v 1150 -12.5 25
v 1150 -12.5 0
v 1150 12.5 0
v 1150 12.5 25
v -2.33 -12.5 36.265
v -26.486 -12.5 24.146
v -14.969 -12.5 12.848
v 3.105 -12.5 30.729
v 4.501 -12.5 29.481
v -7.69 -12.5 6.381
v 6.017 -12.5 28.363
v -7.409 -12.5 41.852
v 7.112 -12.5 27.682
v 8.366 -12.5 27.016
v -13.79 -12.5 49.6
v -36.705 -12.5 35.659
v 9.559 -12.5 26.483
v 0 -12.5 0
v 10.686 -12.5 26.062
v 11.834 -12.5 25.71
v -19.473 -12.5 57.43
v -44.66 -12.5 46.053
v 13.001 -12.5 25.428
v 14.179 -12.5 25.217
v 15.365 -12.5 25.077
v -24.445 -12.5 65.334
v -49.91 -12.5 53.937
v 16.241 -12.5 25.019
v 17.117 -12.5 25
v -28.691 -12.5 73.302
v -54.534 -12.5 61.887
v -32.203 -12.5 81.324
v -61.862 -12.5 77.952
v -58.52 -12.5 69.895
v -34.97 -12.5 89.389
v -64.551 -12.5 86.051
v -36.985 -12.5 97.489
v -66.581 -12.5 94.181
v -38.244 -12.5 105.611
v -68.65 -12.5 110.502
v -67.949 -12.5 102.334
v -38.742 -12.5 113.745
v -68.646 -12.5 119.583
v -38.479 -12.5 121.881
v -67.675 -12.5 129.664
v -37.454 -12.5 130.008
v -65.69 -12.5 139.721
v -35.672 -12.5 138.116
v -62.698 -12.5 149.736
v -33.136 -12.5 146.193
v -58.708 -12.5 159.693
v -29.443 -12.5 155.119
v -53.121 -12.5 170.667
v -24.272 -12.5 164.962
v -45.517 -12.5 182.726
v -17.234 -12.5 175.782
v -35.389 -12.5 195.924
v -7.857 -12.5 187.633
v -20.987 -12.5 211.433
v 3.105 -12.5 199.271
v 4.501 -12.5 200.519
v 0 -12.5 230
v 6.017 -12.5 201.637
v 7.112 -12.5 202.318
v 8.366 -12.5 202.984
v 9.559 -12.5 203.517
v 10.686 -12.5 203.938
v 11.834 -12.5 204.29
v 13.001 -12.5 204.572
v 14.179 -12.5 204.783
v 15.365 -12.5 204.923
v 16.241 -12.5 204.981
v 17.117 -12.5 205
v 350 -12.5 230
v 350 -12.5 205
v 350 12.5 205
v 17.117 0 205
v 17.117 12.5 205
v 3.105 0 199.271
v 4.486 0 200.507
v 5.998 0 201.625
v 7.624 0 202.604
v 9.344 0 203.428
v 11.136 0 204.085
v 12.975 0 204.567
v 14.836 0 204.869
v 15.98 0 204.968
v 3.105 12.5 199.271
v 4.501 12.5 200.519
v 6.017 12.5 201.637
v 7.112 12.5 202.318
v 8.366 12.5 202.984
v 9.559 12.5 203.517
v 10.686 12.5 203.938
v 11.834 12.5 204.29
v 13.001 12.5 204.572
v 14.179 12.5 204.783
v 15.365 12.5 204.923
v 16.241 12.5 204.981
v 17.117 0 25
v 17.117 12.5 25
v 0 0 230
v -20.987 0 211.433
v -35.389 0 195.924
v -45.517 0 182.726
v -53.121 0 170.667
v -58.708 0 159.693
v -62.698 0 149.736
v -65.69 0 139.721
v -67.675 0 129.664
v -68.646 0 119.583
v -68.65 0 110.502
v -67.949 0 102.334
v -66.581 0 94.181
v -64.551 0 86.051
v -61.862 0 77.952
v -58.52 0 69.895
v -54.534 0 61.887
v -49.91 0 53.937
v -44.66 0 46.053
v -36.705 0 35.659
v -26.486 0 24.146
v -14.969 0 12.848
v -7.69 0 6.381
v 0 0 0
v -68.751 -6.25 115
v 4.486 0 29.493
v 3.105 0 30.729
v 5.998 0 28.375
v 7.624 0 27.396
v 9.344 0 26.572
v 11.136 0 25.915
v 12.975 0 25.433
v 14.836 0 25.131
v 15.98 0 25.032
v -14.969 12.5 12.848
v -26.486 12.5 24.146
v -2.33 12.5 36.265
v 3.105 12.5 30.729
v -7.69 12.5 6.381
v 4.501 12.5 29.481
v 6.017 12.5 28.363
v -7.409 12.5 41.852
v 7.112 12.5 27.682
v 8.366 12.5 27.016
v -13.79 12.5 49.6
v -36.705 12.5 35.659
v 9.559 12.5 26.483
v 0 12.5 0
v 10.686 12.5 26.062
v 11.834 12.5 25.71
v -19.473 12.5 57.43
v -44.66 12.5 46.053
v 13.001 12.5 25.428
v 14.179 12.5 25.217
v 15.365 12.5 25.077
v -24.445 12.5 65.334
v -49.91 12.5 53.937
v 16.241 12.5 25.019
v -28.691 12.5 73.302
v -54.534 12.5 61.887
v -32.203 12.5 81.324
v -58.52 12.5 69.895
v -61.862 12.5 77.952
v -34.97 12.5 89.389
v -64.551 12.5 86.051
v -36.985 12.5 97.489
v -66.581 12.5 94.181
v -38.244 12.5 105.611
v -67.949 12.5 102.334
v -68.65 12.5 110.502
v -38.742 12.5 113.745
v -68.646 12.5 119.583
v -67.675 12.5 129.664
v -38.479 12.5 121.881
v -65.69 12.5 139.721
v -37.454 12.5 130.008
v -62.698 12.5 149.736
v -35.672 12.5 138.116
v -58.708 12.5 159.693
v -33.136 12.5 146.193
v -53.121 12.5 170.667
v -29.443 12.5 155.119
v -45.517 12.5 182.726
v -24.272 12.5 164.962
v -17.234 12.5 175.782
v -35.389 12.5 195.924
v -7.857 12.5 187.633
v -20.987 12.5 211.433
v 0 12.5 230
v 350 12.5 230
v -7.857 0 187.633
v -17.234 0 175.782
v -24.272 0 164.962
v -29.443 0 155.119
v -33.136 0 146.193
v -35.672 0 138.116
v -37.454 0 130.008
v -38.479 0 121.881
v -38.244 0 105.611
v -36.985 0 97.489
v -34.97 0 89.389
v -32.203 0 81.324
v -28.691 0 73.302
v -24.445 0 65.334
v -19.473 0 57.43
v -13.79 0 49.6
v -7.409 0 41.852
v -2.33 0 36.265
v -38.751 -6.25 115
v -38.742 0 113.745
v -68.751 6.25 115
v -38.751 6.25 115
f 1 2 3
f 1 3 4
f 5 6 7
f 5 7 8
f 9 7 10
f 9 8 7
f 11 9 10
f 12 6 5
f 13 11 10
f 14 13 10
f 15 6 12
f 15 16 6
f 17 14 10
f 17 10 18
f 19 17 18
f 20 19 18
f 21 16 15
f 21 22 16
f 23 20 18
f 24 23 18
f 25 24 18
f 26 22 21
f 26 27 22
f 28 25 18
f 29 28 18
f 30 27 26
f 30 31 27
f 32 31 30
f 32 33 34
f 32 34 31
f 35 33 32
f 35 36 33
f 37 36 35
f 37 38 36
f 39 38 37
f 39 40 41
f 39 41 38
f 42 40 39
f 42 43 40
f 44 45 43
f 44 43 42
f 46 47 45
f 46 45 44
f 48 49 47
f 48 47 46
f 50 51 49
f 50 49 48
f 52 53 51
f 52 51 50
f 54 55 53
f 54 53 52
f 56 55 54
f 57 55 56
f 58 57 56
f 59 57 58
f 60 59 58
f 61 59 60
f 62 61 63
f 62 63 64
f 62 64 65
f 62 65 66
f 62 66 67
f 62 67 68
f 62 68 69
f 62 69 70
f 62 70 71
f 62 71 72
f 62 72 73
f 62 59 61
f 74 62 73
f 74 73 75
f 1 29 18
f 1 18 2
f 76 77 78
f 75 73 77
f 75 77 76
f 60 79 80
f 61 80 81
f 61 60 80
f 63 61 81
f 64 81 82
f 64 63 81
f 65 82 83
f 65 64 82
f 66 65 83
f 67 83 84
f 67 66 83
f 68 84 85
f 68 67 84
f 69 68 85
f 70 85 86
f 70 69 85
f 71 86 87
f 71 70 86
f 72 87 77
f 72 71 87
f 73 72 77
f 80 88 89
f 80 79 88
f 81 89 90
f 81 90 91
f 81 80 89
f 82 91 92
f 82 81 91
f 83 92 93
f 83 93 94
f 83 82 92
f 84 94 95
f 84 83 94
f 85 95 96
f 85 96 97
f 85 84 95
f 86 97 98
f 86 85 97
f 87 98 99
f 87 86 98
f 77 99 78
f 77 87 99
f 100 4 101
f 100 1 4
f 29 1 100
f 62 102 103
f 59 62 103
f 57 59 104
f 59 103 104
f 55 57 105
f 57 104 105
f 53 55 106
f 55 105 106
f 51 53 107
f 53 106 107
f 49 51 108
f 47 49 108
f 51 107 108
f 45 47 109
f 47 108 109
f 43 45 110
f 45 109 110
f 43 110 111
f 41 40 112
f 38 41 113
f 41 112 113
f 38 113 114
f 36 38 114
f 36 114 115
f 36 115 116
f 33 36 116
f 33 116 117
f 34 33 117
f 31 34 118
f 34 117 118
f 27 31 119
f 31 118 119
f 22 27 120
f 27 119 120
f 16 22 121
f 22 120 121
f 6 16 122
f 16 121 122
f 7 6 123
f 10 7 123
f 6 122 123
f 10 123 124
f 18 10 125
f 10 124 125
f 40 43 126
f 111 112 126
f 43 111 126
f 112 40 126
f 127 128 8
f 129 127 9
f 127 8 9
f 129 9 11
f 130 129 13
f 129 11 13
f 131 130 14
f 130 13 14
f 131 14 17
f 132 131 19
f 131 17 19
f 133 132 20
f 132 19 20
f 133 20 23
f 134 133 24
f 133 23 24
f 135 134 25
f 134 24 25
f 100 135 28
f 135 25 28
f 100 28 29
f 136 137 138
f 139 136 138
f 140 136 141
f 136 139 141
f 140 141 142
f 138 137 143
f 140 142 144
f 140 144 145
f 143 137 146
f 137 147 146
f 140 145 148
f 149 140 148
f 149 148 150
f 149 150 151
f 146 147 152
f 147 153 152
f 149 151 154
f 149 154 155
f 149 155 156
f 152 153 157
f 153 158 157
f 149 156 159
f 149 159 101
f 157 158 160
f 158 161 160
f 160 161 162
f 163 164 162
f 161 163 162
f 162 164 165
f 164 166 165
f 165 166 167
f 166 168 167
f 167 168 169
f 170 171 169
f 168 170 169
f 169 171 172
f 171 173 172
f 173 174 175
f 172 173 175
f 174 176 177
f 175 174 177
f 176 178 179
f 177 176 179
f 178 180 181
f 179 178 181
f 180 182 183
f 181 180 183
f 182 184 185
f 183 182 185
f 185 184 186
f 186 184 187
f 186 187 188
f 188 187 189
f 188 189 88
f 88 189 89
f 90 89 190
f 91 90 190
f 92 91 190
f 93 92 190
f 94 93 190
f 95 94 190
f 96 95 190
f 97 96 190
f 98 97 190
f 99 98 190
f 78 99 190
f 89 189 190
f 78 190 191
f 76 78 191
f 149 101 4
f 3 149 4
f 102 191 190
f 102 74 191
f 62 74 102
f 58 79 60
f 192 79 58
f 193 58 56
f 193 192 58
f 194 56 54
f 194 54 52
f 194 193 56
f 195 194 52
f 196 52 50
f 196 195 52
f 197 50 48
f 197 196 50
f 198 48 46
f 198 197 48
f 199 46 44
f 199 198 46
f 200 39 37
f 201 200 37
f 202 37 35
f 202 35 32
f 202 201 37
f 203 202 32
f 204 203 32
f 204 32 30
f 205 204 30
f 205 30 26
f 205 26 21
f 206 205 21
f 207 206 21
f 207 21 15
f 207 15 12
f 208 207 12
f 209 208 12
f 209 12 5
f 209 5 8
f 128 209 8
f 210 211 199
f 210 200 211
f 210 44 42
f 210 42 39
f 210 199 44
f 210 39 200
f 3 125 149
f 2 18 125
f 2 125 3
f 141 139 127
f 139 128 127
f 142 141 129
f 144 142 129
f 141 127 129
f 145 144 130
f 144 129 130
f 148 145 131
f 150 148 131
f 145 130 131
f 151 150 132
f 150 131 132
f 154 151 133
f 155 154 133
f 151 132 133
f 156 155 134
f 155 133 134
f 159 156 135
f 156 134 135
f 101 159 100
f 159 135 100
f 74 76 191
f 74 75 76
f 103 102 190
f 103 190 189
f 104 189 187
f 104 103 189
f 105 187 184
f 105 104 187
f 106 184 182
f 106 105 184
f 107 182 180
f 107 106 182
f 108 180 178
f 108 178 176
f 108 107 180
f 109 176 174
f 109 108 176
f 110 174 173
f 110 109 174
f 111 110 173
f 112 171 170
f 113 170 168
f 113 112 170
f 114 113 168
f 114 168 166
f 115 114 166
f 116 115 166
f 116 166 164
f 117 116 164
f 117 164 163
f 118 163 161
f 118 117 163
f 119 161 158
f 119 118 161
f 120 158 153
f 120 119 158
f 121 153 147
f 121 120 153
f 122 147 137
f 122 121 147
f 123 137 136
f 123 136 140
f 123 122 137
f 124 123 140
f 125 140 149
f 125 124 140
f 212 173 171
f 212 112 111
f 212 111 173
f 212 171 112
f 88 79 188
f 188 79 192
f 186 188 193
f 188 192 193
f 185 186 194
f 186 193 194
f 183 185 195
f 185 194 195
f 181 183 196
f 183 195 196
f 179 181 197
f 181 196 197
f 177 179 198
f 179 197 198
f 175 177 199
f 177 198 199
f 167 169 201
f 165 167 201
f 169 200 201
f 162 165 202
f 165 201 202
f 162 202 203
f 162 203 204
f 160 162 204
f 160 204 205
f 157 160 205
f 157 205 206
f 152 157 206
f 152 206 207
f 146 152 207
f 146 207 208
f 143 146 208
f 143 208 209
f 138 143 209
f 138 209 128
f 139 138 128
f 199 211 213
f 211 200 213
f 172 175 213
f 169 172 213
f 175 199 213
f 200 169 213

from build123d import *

# Parameters (mm, degrees)
F1_DEPTH = 12.5
F2_R     = 20


with BuildPart() as f1:
    # F0 (on Front) → F1 (new body, symmetric)
    with BuildSketch(Plane.XZ):
        with BuildLine():
            add(Edge.make_bspline(
                [(0, 230), (-143.18813182, 115), (0, 0)],
                knots=[5.8897826752, 5.8897826752, 5.8897826752, 6.6765879392, 6.6765879392, 6.6765879392], degree=2, weights=[1, 0.9236100668, 1]))
            Line((0, 0), (1150, 0))
            Line((1150, 0), (1150, 25))
            Line((1150, 25), (9.1600259417, 25))
            add(Edge.make_bspline(
                [(9.1600259417, 205), (-89.4541344002, 115), (9.1600259417, 25)],
                knots=[5.949769397, 5.949769397, 5.949769397, 6.6166012174, 6.6166012174, 6.6166012174], degree=2, weights=[1, 0.9449299244, 1]))
            Line((9.1600259417, 205), (350, 205))
            Line((350, 205), (350, 230))
            Line((350, 230), (0, 230))
        make_face()
    extrude(amount=F1_DEPTH, both=True)

    # F2
    f2_edges = [f1.edges().sort_by_distance(p)[0] for p in [
        (9.160026, -6.25, 25),
        (9.160026, 6.25, 25),
        (9.160026, -6.25, 205),
        (9.160026, 6.25, 205),
    ]]
    fillet(f2_edges, radius=F2_R)


solid = f1.part
